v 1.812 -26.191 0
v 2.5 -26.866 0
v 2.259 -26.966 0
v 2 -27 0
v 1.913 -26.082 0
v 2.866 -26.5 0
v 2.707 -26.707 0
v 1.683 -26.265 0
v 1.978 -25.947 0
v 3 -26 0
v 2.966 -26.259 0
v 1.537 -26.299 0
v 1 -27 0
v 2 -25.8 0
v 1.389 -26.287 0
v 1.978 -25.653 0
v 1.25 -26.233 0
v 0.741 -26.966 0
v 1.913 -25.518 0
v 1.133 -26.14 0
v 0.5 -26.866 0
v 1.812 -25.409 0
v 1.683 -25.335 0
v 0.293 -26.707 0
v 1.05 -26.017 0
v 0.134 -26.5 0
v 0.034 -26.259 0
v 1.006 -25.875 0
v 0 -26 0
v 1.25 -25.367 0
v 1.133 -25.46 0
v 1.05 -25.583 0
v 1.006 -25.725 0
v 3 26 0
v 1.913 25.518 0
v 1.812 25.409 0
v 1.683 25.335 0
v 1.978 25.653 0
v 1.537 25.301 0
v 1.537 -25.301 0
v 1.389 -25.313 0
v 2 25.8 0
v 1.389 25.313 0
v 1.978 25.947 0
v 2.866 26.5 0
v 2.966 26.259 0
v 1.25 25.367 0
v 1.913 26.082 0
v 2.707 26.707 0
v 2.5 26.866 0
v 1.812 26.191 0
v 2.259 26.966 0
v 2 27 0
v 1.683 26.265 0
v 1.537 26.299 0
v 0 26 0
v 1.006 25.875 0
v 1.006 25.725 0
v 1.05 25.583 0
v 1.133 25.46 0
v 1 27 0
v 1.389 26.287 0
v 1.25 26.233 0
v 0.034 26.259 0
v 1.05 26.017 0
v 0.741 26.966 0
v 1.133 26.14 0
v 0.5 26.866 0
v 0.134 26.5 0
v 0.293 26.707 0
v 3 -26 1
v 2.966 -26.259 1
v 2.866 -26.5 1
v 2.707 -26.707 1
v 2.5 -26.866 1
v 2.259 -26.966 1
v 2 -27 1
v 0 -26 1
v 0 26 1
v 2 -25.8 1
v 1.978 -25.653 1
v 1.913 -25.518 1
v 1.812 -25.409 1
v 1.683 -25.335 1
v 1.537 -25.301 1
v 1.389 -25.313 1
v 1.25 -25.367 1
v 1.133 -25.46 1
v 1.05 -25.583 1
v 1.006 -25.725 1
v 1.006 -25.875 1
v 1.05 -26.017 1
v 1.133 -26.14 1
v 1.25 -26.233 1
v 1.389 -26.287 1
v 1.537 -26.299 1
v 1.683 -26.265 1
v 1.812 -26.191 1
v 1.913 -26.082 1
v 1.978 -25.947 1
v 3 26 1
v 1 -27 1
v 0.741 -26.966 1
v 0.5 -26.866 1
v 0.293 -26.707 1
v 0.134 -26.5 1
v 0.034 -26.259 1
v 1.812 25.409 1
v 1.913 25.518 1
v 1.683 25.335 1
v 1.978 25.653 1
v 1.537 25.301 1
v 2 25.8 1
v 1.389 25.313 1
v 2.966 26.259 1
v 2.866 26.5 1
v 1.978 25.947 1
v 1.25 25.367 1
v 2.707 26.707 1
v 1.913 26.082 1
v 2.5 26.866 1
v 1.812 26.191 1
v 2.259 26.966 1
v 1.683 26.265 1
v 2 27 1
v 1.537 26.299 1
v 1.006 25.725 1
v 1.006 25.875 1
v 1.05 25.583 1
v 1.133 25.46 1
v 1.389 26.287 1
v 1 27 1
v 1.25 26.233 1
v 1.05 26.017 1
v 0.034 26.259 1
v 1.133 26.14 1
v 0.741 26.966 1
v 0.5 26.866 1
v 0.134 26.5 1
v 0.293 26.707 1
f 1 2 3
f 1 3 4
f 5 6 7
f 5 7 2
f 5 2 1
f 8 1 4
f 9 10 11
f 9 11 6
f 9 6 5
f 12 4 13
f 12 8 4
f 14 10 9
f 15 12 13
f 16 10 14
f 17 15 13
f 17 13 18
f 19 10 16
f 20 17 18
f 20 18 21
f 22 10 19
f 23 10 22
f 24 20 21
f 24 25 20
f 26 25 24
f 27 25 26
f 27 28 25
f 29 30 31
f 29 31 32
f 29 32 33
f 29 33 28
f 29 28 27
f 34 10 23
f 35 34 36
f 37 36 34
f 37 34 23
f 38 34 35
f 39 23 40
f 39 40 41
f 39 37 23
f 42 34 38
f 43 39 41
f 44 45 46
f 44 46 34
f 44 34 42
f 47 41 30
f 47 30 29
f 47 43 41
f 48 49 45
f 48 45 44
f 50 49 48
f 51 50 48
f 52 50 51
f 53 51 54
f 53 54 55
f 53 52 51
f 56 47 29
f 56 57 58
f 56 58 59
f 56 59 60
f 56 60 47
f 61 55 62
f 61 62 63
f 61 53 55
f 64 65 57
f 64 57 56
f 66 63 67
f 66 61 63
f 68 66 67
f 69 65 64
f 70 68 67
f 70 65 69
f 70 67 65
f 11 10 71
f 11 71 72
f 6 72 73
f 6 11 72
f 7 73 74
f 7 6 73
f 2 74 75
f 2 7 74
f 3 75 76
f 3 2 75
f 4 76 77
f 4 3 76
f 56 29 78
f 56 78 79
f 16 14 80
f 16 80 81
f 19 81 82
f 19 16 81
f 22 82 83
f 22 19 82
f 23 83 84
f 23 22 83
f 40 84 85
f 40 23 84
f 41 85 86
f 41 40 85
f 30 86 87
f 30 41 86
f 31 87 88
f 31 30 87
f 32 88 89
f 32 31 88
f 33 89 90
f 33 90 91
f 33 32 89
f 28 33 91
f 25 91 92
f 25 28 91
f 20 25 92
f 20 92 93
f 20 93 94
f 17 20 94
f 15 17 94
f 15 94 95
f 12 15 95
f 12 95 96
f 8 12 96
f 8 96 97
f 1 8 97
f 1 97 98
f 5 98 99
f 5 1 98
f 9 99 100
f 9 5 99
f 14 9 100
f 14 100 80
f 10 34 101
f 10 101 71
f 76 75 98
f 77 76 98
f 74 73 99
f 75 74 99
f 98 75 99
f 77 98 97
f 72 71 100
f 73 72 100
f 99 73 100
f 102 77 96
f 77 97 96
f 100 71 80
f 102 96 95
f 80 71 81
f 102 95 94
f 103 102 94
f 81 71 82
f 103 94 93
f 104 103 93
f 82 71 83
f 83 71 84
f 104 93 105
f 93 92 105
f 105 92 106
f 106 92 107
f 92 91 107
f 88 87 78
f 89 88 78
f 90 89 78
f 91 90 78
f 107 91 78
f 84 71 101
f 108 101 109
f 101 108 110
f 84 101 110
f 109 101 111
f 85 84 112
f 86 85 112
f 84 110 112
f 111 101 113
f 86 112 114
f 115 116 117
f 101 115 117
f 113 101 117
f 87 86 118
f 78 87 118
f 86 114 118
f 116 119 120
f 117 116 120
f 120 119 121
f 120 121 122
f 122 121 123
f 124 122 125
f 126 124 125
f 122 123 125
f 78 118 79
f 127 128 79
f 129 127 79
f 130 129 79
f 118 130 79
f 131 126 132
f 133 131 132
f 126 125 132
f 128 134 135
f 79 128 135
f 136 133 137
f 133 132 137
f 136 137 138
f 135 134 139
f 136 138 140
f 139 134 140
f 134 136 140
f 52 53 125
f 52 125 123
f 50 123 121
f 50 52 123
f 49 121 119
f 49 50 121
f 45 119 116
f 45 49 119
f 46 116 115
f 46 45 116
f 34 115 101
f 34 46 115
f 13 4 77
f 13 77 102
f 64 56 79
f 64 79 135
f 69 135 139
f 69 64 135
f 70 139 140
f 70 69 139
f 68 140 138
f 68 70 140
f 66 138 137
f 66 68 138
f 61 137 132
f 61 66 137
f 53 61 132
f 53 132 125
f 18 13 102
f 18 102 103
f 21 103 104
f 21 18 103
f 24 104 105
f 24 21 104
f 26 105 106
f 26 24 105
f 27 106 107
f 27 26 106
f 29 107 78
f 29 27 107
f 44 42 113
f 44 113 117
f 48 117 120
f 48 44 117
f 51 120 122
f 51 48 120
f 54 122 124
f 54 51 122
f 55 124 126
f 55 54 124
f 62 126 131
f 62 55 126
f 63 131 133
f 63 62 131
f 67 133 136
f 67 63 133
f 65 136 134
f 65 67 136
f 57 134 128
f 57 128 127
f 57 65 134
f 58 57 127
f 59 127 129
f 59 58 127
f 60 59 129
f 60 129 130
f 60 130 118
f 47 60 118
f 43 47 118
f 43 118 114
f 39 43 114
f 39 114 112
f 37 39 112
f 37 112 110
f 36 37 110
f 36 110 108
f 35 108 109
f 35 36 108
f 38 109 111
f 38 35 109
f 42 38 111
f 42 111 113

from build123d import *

# Parameters (mm, degrees)
SKETCH1_R           = 0.5
BOSS_EXTRUDE1_DEPTH = 1


with BuildPart() as part:
    # Sketch1 → Boss-Extrude1 (new body)
    with BuildSketch(Plane.XY):
        with BuildLine():
            Line((1, 27), (2, 27))
            ThreePointArc((2, 27), (2.707106781, 26.707106781), (3, 26))
            Line((3, 26), (3, -26))
            ThreePointArc((3, -26), (2.707106781, -26.707106781), (2, -27))
            Line((2, -27), (1.5, -27))
            Line((1.5, -27), (1, -27))
            ThreePointArc((1, -27), (0.292893219, -26.707106781), (0, -26))
            Line((0, -26), (0, 26))
            ThreePointArc((0, 26), (0.292893219, 26.707106781), (1, 27))
        make_face()
        with Locations((1.5, 25.8)):
            Circle(SKETCH1_R, mode=Mode.SUBTRACT)
        with Locations((1.5, -25.8)):
            Circle(SKETCH1_R, mode=Mode.SUBTRACT)
    extrude(amount=BOSS_EXTRUDE1_DEPTH)


solid = part.part
